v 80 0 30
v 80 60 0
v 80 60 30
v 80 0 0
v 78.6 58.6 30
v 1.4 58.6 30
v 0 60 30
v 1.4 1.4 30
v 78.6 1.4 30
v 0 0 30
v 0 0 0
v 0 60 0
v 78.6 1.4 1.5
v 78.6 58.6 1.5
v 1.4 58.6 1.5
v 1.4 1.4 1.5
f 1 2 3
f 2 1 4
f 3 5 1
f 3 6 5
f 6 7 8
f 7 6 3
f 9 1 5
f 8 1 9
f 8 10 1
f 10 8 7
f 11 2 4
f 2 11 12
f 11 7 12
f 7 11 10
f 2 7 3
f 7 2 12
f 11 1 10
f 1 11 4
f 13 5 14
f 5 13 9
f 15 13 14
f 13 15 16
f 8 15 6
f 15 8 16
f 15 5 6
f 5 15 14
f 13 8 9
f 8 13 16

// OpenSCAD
$fn = 32;

// ----------------------------------------------------------------------
// Open box: 1.4 mm walls
// ----------------------------------------------------------------------

// --- parameters (mm) ---
box_l = 80;               // outer length, X
box_w = 60;               // outer width, Y
box_h = 30;               // outer height, Z
wall = 1.4;               // wall thickness
floor = 1.5;              // floor thickness

difference() {
  cube([box_l, box_w, box_h]);
  translate([wall, wall, floor])
    cube([box_l - 2 * wall, box_w - 2 * wall, box_h]);
}
